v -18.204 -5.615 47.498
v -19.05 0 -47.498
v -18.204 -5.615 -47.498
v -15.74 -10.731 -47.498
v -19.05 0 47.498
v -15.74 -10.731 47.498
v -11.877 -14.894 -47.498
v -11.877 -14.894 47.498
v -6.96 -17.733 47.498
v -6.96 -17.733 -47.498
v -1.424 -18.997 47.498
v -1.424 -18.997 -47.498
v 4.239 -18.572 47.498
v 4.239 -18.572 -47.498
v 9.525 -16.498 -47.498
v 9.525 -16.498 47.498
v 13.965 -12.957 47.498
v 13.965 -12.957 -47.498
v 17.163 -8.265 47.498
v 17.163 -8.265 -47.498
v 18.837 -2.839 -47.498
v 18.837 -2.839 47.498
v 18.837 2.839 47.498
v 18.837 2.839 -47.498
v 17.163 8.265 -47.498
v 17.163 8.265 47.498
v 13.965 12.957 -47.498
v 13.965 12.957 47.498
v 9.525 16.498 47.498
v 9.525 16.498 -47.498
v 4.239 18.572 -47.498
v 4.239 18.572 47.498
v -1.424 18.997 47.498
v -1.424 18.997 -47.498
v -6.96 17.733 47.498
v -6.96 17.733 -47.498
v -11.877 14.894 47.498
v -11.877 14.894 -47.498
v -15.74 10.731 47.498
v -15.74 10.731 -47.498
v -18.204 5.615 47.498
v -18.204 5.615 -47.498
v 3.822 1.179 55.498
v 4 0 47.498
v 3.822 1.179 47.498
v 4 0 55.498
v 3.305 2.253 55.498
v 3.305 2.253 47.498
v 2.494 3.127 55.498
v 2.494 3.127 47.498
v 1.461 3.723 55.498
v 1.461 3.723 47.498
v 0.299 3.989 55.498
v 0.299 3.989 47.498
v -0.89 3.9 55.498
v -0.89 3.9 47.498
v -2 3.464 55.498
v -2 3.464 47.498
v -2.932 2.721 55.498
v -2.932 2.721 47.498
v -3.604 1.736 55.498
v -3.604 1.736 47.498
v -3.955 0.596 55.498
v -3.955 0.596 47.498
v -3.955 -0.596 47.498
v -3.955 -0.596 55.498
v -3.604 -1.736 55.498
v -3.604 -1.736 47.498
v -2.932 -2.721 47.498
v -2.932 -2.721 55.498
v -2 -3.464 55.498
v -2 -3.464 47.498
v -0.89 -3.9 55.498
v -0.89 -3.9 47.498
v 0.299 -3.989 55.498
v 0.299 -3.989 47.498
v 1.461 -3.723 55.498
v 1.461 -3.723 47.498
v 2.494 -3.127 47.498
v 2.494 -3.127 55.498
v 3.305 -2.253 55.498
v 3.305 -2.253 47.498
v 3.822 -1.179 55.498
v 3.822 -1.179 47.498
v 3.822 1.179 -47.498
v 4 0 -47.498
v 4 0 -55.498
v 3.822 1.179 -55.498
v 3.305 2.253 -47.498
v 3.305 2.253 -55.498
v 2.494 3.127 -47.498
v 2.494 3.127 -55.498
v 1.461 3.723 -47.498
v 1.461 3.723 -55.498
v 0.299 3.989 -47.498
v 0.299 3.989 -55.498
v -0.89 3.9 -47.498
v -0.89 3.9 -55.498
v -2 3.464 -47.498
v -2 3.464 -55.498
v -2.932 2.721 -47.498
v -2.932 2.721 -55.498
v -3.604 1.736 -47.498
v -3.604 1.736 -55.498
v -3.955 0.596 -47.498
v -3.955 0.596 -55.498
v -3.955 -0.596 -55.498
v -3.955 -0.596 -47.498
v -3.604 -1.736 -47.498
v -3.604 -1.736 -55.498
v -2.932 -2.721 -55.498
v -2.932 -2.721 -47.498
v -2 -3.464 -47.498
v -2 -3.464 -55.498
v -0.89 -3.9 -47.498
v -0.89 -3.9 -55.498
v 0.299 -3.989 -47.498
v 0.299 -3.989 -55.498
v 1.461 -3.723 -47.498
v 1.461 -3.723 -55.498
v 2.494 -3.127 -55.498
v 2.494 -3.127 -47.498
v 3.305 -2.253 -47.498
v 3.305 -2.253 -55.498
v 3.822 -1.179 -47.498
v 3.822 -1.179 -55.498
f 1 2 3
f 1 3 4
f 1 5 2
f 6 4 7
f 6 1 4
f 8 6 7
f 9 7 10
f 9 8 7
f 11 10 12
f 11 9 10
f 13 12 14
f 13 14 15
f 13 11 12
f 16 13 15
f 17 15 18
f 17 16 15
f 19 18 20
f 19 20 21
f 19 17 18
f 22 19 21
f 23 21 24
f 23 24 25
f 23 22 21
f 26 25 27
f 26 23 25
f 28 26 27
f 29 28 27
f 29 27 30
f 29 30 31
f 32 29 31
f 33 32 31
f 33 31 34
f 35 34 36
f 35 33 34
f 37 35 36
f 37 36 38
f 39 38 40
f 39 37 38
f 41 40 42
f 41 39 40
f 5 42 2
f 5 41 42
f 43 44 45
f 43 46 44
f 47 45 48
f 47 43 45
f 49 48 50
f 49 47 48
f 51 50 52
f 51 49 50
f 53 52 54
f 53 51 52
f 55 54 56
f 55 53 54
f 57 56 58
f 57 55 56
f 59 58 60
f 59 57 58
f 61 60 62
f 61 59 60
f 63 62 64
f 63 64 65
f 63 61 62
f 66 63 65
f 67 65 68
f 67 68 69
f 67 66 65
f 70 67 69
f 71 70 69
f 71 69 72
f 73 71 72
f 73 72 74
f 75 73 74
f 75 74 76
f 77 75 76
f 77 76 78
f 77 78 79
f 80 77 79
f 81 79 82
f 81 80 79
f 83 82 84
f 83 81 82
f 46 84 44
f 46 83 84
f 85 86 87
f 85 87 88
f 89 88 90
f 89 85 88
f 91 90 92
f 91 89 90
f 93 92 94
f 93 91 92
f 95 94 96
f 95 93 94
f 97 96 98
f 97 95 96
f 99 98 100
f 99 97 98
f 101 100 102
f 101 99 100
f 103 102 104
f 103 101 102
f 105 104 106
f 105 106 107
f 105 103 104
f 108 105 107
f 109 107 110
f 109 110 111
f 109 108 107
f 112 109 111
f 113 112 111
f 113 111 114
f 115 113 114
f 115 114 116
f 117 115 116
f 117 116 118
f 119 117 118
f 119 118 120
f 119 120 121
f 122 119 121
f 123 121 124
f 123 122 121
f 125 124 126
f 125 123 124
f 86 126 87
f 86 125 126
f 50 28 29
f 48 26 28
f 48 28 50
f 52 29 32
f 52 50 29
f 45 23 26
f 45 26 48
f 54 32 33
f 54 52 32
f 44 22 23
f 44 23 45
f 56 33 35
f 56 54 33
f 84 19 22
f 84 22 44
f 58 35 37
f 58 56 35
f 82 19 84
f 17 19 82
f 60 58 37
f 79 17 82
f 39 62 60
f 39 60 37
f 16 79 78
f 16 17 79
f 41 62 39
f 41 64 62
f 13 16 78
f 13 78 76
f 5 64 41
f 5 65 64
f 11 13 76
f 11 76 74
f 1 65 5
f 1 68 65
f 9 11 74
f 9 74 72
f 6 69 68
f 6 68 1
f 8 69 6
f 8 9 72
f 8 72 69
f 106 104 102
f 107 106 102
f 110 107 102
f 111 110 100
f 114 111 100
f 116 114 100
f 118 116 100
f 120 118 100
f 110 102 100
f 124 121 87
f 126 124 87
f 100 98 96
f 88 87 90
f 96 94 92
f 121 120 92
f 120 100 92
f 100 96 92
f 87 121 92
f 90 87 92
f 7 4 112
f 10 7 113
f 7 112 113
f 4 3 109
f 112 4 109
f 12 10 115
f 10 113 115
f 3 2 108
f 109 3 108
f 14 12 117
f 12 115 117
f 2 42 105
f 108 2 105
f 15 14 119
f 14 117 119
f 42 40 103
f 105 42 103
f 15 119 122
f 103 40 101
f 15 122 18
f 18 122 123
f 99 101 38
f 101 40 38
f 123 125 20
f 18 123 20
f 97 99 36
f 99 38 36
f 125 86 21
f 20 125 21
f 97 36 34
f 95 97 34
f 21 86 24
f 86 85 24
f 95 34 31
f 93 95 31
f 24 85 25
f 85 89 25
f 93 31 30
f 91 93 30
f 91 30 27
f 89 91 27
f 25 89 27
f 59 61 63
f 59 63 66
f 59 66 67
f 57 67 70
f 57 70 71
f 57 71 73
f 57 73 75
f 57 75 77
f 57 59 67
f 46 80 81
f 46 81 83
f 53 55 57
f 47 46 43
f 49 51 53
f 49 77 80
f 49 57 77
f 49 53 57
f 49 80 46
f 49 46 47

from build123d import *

# Parameters (mm, degrees)
SKETCH1_R           = 19.05
BOSS_EXTRUDE1_DEPTH = 47.498
SKETCH1_3_R         = 4
BOSS_EXTRUDE2_DEPTH = 55.498


with BuildPart() as part:
    # Sketch1 → Boss-Extrude1 (new, symmetric)
    with BuildSketch(Plane.XY):
        Circle(SKETCH1_R)
    extrude(amount=BOSS_EXTRUDE1_DEPTH, both=True)

    # Sketch1<3> → Boss-Extrude2 (add, symmetric)
    with BuildSketch(Plane.XY):
        Circle(SKETCH1_3_R)
    extrude(amount=BOSS_EXTRUDE2_DEPTH, both=True)


solid = part.part
